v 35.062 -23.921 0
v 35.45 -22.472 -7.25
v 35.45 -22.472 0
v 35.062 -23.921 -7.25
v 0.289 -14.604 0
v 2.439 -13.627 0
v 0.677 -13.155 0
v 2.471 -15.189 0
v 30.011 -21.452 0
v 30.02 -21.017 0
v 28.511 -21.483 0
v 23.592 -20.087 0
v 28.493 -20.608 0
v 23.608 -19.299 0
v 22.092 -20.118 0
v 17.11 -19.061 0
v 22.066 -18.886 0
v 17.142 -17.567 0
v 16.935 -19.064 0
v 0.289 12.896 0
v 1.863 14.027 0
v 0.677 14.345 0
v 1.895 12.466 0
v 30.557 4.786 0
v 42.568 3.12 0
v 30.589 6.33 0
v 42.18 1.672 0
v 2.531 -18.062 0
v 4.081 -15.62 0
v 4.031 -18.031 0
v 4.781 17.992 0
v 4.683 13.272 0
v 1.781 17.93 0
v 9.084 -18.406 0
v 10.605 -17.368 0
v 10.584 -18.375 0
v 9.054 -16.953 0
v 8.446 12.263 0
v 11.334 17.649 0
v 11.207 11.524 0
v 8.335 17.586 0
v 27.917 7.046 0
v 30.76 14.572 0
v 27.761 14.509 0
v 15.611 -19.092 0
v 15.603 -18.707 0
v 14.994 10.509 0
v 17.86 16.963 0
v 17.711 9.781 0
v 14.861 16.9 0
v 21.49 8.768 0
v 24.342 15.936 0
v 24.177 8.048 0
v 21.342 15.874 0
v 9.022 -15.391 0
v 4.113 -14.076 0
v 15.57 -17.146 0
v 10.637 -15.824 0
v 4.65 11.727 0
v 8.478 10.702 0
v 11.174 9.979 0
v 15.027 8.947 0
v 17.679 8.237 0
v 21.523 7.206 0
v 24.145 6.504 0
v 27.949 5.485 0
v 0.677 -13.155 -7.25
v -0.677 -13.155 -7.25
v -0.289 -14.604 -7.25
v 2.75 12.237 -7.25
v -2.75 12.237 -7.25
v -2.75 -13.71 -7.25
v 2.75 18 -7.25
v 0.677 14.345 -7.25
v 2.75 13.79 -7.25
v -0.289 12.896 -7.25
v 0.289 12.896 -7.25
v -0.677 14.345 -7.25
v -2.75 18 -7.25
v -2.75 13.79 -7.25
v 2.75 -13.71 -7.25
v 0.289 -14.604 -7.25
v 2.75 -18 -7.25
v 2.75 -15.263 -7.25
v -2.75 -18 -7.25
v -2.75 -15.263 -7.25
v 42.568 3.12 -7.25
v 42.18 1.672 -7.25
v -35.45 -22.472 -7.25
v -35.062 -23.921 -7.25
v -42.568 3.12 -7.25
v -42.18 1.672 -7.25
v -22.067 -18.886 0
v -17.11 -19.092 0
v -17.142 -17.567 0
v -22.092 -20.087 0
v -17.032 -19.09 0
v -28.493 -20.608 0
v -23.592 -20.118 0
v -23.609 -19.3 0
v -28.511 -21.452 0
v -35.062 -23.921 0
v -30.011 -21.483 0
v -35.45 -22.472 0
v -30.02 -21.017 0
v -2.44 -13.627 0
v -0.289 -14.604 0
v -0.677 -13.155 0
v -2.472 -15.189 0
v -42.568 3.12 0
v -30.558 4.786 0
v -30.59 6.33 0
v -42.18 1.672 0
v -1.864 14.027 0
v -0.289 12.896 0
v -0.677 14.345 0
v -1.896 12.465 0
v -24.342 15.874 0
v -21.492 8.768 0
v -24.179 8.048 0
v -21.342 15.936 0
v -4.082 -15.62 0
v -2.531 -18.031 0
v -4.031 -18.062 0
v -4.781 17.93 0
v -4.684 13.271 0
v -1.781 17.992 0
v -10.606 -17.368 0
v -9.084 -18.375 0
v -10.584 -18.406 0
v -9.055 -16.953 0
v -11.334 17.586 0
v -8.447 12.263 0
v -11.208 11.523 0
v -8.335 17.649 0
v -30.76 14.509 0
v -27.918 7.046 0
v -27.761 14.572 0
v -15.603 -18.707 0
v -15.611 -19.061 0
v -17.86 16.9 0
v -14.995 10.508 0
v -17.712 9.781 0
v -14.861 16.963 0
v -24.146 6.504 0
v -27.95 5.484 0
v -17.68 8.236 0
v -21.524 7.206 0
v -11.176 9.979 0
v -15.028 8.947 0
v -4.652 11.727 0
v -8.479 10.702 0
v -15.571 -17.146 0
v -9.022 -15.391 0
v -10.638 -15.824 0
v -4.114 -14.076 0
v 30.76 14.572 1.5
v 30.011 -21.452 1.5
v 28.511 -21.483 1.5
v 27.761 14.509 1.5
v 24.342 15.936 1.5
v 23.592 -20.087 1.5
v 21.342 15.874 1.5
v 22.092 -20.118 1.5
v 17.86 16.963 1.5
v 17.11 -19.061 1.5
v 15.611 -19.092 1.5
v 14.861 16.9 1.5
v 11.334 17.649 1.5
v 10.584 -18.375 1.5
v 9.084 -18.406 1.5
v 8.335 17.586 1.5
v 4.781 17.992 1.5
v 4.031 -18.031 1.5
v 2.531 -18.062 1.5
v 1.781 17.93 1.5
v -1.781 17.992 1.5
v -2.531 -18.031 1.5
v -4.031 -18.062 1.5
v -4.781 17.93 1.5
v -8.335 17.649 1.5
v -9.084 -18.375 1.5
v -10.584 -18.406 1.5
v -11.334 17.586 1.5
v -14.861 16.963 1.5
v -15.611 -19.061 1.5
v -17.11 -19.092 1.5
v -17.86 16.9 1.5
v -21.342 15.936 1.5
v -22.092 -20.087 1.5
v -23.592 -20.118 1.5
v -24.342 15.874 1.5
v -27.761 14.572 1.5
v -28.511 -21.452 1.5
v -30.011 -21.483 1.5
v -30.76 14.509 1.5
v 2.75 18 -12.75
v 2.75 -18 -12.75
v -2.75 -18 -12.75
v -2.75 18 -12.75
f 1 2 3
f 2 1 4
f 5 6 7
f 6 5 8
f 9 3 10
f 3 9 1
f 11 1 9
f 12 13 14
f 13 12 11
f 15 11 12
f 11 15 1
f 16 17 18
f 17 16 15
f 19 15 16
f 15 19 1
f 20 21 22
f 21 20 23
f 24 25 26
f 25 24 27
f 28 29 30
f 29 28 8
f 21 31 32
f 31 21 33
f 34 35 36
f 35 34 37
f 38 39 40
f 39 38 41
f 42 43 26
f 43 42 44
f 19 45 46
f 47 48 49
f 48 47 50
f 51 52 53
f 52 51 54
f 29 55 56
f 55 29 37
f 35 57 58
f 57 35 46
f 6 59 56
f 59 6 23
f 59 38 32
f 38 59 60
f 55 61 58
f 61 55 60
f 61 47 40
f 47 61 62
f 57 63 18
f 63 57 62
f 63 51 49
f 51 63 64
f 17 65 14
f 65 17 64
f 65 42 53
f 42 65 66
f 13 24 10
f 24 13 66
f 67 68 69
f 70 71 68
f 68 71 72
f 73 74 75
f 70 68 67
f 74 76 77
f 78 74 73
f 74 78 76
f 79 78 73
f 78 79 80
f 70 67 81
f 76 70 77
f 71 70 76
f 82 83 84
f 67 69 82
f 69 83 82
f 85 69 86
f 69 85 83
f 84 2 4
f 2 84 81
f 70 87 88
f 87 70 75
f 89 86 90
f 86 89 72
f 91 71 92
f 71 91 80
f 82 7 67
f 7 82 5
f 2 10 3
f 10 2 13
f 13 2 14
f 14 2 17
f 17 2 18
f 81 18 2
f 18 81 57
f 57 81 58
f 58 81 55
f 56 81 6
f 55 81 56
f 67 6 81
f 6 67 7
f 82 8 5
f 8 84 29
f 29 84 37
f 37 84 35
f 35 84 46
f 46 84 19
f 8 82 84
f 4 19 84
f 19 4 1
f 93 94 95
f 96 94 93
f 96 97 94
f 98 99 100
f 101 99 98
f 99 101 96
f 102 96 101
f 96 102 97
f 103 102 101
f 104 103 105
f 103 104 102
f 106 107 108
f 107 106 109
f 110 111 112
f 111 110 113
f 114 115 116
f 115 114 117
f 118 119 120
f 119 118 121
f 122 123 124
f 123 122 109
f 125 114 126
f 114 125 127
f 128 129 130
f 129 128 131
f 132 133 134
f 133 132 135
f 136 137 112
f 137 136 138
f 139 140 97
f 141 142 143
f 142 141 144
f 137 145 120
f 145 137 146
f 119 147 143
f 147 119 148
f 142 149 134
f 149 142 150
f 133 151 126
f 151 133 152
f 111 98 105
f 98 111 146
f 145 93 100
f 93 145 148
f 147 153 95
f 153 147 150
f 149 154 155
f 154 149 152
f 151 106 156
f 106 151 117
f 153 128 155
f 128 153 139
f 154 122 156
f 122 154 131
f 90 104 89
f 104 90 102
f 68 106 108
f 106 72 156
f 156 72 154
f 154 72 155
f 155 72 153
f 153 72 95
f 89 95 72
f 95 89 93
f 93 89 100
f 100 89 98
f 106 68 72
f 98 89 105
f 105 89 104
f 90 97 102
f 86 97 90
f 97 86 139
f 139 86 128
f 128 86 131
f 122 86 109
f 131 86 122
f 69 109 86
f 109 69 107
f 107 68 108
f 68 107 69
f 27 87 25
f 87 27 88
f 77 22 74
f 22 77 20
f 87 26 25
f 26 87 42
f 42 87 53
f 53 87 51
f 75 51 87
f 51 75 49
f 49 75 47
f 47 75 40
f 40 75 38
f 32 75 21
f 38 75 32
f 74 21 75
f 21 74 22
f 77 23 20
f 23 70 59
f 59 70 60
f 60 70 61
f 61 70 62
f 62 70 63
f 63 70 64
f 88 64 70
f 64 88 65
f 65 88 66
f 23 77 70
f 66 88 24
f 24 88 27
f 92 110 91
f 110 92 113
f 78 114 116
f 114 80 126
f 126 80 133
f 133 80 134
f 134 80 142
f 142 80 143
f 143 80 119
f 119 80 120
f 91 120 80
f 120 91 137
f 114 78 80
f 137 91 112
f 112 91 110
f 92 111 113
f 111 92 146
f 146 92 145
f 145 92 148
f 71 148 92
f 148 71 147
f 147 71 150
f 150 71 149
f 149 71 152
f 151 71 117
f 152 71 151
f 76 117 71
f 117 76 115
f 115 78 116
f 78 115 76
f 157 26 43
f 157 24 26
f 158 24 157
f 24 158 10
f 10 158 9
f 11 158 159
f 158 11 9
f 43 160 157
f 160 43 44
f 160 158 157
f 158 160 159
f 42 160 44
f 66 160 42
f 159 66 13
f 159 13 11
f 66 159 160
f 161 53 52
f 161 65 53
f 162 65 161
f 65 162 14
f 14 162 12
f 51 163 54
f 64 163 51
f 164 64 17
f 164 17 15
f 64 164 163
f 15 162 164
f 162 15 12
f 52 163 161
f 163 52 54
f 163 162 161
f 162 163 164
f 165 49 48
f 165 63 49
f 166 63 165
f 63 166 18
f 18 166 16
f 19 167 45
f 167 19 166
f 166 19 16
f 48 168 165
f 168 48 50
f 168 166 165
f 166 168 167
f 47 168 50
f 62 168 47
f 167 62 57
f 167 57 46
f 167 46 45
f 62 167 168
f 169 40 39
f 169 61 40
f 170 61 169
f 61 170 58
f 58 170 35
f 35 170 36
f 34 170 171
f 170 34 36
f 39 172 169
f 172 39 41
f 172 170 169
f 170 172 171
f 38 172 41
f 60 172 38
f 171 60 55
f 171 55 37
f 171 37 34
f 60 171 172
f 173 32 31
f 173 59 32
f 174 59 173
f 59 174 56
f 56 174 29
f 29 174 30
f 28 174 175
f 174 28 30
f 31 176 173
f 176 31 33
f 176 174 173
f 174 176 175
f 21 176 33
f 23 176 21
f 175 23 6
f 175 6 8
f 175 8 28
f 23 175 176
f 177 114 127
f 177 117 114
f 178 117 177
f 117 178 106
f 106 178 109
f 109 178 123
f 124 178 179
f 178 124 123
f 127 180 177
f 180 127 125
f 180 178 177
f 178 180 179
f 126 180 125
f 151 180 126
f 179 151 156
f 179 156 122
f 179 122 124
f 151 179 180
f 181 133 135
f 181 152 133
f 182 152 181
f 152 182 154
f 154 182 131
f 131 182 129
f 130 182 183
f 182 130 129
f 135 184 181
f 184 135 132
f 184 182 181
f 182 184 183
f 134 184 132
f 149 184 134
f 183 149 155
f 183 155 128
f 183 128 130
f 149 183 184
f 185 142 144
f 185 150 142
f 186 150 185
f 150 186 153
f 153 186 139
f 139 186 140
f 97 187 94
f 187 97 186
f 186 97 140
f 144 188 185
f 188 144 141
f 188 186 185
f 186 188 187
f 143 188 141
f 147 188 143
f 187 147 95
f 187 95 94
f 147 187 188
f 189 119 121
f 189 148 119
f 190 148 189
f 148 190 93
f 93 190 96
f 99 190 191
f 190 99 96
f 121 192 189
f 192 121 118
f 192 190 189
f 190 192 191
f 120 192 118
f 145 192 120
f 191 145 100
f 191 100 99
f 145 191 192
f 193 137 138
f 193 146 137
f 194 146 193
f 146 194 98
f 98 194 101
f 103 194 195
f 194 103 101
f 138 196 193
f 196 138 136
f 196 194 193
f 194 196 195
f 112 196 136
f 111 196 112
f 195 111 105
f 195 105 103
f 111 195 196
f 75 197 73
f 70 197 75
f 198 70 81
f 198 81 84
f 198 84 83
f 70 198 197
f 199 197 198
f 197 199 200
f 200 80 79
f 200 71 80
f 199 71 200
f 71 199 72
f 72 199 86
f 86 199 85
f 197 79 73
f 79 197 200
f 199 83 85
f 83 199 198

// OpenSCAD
// FUNCTIONS:

function hypotenuse(x,y) = sqrt ( x*x + y*y );

// PARAMETERS:

// All distances are in inches.
//
corner_angle = 30;  // Degrees, angle of corner.
corner_long = 36;   // Length of long side covered by
		    // tapered treads.
number_tapered = 10; // Number of tapered treads.

// PARAMETERS USUALLY NOT CHANGED:
//
// Stringers are 2x8's.  Sill is 6x6.
//
tread_width = 3*12;	// Tread width.
stringer_space = 27.5;	// Distance between stringer centers.
tapered_long = 3;	// Length long end of tapered tread.
tapered_short = 1.5;	// Length short end of tapered tread.
stringer_short_length = 3*12;  // Length shorter stringer.

// z axis is vertical; x axis it along boardwalk;
// y axis is across boardwalk.
//
// Origin is center of sills top.  z == 0 is bottom of
// treads.

// COMPONENTS:

module sill()
{
    color ("LightGray")
	    cube ([5.5,tread_width,5.5]);
}
module stringer( length )
{
    color ("Chocolate")
        cube ([length,1.5,7.25]);
}

module tread()
{
    color ("SandyBrown")
    translate ( [0,-3.5,7.25] )
    cube ([5.5,tread_width,1.5]);
}

// Computed so the line joining the halfway points of
// the long and short ends aligns with the y axis and
// has the origin as its center.
//
module tapered_tread()
{
    bisector_angle = atan2 ( (3.0-1.5)/2, tread_width);
    color ("SandyBrown")
    rotate ( [0,0,bisector_angle] )
    translate ( [-(1.5+3.0)/4,-tread_width/2,0] )
    linear_extrude ( 1.5 )
    {
	polygon ( [ [0,0], [0,tread_width,],
		    [tapered_long,tread_width],
		    [tapered_short,0] ] );
    }
}

// ASSEMBLIES:

module sills() {
    translate ([-5.5/2,-tread_width/2,-5.5-7.25])
	sill();
}
module stringers()
{

    stringer_long_length =
          stringer_short_length
	+ stringer_space * tan ( corner_angle / 2 );

    translate([0,-stringer_space/2,0])
	rotate ([0,0,-corner_angle/2])
	    translate ([0.5,-1.5/2,-7.25])
		stringer ( stringer_short_length );

    translate([0,-stringer_space/2,0])
	rotate ([0,0,corner_angle/2])
	    translate ([-stringer_short_length-0.5,-1.5/2,-7.25])
		stringer ( stringer_short_length );

    translate([0,stringer_space/2,0])
	rotate ([0,0,-corner_angle/2])
	    translate ([0.5,-1.5/2,-7.25])
		stringer ( stringer_long_length );

    translate([0,stringer_space/2,0])
	rotate ([0,0,corner_angle/2])
	    translate ([-stringer_long_length-0.5,-1.5/2,-7.25])
		stringer ( stringer_long_length );

}

module tapered_treads()
{
    // Define a circle such that it is tangent to the long
    // stringers at the point corner_long inches from the
    // point where the midlines of the two long stringers
    // intersect.  The center of this circle is on the y
    // axis, and the tangent points are at angles +-
    // corner_angle/2 relative to the center of the circle.
    //
    radius = corner_long / sin ( corner_angle/2 );
    center_y = - radius + stringer_space/2;
    delta_angle = corner_angle/number_tapered;
    for ( da = [- corner_angle/2 + delta_angle/2:
                delta_angle:corner_angle/2] )
    {
        x = center_y * sin ( da );
	y = center_y - center_y * cos ( da );
	translate ( [x, y, 0] )
	    tapered_tread();
    }
}

sills();
stringers();
tapered_treads();
